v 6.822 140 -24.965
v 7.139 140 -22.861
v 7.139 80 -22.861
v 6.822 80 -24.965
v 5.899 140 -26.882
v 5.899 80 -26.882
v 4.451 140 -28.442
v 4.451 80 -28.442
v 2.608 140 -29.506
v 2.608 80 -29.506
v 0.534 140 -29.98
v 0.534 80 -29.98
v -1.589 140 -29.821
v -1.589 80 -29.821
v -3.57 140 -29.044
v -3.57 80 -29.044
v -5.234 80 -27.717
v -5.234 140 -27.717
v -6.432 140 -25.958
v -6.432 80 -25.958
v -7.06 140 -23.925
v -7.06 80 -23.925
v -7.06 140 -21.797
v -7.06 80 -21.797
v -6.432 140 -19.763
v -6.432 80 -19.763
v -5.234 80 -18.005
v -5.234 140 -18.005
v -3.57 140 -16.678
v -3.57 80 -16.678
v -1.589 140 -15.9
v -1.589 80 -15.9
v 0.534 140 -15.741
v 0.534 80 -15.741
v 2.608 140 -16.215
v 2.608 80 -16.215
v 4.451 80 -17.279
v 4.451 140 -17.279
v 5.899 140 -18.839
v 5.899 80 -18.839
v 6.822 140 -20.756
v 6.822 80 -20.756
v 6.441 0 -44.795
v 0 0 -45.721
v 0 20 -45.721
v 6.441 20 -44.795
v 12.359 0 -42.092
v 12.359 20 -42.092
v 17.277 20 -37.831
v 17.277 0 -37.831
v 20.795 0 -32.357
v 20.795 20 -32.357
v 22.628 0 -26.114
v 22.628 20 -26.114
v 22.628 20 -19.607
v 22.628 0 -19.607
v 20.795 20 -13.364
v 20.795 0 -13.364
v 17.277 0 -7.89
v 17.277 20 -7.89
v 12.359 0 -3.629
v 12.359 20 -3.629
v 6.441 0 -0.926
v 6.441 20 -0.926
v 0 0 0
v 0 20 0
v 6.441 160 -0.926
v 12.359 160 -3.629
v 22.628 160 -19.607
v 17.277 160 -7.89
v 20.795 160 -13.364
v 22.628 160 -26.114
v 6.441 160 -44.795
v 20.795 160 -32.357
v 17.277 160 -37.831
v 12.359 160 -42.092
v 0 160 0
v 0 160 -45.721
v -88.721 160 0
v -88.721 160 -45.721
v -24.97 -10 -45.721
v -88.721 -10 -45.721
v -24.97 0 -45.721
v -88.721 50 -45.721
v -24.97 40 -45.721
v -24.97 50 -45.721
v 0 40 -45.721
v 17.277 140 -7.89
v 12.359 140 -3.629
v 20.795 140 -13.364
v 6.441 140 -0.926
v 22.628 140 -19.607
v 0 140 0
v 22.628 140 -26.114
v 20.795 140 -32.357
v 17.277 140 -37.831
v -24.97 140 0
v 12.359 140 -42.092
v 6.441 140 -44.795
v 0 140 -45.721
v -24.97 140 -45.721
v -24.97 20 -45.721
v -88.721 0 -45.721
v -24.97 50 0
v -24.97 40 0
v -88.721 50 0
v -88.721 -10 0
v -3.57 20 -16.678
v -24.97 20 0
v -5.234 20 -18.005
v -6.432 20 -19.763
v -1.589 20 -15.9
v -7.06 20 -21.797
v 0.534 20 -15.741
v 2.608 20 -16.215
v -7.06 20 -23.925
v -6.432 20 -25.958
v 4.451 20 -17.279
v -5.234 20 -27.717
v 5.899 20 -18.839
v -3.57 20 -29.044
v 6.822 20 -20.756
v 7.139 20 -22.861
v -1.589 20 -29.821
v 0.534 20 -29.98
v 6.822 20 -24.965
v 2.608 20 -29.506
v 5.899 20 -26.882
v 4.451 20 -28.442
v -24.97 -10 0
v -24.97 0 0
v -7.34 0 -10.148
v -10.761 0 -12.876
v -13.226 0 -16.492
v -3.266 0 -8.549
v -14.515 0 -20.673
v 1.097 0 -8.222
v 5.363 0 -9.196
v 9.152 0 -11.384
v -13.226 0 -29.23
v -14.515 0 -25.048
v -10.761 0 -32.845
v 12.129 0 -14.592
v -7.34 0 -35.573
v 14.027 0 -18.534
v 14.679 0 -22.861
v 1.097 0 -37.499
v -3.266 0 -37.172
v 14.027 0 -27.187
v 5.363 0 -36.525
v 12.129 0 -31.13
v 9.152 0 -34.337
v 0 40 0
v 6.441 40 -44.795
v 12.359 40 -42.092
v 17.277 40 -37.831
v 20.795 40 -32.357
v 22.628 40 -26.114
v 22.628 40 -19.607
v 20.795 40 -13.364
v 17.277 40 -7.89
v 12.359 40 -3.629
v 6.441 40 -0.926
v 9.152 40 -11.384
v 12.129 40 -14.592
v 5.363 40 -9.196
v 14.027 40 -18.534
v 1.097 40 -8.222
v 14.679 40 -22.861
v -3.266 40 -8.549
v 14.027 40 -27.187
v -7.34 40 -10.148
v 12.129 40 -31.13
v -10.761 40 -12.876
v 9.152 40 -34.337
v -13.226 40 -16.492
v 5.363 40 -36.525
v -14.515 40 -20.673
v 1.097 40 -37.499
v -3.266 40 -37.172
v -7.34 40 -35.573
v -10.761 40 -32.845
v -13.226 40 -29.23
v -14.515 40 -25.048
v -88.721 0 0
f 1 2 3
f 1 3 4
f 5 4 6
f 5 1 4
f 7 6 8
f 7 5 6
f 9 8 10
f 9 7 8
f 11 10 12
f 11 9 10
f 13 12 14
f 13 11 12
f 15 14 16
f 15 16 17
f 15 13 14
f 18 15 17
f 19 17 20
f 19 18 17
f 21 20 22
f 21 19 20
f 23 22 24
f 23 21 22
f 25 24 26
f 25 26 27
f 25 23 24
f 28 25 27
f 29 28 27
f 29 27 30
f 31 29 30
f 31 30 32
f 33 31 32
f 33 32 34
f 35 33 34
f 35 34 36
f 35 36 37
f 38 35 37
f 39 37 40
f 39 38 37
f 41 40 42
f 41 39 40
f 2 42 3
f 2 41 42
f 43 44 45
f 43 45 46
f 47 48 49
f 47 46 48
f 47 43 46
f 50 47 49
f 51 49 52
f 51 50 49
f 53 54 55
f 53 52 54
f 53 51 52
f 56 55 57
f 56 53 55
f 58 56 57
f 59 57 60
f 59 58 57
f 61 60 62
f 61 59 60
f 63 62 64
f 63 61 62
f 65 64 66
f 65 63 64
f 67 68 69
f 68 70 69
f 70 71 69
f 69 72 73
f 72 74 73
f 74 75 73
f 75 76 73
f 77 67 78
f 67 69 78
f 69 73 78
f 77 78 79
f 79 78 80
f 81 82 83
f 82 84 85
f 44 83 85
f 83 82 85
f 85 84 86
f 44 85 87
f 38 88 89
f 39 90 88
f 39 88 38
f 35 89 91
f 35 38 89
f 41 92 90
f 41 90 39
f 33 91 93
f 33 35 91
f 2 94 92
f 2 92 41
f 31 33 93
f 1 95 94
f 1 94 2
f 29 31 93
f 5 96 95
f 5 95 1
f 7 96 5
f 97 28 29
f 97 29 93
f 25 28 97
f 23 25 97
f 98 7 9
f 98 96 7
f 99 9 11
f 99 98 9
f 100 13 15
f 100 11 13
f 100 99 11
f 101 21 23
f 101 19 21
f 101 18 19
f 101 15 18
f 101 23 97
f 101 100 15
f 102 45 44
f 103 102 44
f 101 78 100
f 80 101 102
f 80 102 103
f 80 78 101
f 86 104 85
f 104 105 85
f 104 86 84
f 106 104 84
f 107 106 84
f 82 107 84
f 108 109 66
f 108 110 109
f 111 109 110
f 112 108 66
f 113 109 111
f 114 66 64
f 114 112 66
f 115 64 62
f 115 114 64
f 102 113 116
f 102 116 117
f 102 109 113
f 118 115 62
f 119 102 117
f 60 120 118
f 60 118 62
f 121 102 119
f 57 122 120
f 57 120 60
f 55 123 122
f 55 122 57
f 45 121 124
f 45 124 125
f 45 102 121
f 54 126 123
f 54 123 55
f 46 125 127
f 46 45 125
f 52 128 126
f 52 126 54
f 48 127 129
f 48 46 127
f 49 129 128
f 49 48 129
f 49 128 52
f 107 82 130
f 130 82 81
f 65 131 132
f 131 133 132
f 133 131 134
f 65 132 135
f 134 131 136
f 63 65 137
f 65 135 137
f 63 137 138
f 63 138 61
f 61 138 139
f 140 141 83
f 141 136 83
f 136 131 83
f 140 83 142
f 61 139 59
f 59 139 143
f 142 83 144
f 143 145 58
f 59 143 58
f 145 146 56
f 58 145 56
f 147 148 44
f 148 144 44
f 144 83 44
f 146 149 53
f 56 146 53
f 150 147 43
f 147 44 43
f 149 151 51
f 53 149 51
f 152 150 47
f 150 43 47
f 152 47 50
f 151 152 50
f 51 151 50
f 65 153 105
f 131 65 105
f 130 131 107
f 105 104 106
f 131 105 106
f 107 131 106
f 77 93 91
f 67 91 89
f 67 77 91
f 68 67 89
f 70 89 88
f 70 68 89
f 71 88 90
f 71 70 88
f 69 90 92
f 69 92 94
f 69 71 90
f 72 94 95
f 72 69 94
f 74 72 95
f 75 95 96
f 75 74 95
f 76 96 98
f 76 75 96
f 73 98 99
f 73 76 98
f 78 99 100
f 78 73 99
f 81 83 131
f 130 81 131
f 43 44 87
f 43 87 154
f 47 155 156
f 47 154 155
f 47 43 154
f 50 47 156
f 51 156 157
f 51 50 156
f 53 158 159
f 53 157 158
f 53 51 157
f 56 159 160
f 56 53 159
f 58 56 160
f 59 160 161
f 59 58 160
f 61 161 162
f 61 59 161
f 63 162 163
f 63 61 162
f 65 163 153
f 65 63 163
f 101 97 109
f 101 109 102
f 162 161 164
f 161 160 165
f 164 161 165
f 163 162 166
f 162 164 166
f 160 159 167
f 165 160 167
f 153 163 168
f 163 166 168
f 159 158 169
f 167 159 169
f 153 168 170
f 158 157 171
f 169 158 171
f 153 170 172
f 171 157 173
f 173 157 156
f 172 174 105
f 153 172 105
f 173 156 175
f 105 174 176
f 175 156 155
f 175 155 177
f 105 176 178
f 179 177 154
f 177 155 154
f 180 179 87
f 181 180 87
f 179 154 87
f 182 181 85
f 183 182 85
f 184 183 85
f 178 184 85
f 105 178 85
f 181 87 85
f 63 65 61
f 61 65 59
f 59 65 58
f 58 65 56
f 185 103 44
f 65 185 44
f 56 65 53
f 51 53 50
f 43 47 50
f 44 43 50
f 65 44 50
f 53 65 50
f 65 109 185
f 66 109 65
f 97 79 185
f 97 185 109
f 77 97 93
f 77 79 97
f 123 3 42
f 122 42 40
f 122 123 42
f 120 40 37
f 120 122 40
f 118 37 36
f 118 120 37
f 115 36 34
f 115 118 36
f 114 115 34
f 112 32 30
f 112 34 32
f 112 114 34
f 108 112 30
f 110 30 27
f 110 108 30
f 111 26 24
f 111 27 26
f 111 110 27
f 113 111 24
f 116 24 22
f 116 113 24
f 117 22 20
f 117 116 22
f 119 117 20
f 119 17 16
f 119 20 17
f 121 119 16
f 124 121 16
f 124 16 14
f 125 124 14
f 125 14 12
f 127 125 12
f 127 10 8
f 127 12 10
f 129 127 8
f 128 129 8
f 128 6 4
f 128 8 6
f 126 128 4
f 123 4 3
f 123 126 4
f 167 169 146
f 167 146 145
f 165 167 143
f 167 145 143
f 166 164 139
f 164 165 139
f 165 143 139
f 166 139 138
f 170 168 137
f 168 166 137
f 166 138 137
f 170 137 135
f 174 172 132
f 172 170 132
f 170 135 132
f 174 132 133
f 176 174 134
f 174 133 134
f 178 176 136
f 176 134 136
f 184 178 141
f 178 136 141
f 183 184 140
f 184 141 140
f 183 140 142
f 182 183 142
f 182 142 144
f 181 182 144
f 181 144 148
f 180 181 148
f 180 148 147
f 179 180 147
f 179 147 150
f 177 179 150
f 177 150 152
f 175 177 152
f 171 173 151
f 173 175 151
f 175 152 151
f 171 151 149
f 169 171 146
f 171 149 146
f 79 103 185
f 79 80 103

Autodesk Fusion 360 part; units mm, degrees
sketch "Sketch1" plane through (0, 0, 0) normal (0, 1, 0) x (1, 0, 0)
  line L0 (-88.7207, 45.7211) -> (0, 45.7211)
  line L1 (0, 0) -> (-88.7207, 0)
  line L2 (-88.7207, 0) -> (-88.7207, 45.7211)
  arc A0 (0, 0) -> (0, 45.7211) centre (0, 22.8606) ccw
  circle A1 centre (0, 22.8606) radius 14.6792
  circle A2 centre (0, 22.8606) radius 7.1394
  line L3 (-24.9702, 45.7211) -> (-24.9702, 0)
  dimension "d2" = 88.7207
extrude "Extrude5" add sketch "Sketch1" along normal blind 30 contours L0 L1 L2 L3 | L0 L1 A0 L3 makes body 1
extrude "Extrude1" add sketch "Sketch1" along normal blind 20 separate body contours L0 L1 L2 L3 | L0 L1 A0 L3 | A1 | A2 makes body 2
extrude "Extrude2" add sketch "Sketch1" along normal blind 40 contours L0 L1 L2 L3 | A2 bodies 2
ref_plane "WorkPlane1" through (-1.0548, 20, -22.8606) normal (0, 1, 0) x (1, 0, 0)
extrude "Extrude3" add 1 faces at (2.1441, 40, -23.8931) along direction (0, 1, 0) blind 40 on bodies 2 bodies 2
extrude "Extrude4" add 1 faces at (-67.4705, 40, -30.4807) along direction (0, 1, 0) blind 40 on bodies 2 bodies 2
ref_plane "WorkPlane2" through (0, 80, -22.8606) normal (0, 1, 0) x (1, 0, 0)
mirror "Mirror1" about plane through (0, 80, -22.8606) normal (0, 1, 0) of bodies 2 makes body 3
combine "Combine1" operation add target body 3 tool bodies 2
copy_body "Body->Comp1" bodies 3 removing the originals makes body 4 in component "Component"
extrude "Extrude6" add sketch "Sketch1" along normal blind 5 contours L0 L1 L2 L3 bodies 1
extrude "Extrude7" add sketch "Sketch1" against normal blind 10 contours L0 L1 L2 L3 bodies 1
ref_plane "WorkPlane3" through (-32.9301, 15, -22.8606) normal (0, 1, 0) x (1, 0, 0)
mirror "Mirror2" about plane through (-1.0548, 20, -22.8606) normal (0, 1, 0) of bodies 1 makes body 5
combine "Combine2" operation add target body 1 tool bodies 5
copy_body "Body->Comp2" bodies 1 removing the originals makes body 6 in component "Component'"
component "Component" placed x (1, 0, 0) y (0, 1, 0) z (0, 0, 1) at (0, 0, 0)
component "Component'" placed x (1, 0, 0) y (0, 1, 0) z (0, 0, 1) at (0, 0, 0)
